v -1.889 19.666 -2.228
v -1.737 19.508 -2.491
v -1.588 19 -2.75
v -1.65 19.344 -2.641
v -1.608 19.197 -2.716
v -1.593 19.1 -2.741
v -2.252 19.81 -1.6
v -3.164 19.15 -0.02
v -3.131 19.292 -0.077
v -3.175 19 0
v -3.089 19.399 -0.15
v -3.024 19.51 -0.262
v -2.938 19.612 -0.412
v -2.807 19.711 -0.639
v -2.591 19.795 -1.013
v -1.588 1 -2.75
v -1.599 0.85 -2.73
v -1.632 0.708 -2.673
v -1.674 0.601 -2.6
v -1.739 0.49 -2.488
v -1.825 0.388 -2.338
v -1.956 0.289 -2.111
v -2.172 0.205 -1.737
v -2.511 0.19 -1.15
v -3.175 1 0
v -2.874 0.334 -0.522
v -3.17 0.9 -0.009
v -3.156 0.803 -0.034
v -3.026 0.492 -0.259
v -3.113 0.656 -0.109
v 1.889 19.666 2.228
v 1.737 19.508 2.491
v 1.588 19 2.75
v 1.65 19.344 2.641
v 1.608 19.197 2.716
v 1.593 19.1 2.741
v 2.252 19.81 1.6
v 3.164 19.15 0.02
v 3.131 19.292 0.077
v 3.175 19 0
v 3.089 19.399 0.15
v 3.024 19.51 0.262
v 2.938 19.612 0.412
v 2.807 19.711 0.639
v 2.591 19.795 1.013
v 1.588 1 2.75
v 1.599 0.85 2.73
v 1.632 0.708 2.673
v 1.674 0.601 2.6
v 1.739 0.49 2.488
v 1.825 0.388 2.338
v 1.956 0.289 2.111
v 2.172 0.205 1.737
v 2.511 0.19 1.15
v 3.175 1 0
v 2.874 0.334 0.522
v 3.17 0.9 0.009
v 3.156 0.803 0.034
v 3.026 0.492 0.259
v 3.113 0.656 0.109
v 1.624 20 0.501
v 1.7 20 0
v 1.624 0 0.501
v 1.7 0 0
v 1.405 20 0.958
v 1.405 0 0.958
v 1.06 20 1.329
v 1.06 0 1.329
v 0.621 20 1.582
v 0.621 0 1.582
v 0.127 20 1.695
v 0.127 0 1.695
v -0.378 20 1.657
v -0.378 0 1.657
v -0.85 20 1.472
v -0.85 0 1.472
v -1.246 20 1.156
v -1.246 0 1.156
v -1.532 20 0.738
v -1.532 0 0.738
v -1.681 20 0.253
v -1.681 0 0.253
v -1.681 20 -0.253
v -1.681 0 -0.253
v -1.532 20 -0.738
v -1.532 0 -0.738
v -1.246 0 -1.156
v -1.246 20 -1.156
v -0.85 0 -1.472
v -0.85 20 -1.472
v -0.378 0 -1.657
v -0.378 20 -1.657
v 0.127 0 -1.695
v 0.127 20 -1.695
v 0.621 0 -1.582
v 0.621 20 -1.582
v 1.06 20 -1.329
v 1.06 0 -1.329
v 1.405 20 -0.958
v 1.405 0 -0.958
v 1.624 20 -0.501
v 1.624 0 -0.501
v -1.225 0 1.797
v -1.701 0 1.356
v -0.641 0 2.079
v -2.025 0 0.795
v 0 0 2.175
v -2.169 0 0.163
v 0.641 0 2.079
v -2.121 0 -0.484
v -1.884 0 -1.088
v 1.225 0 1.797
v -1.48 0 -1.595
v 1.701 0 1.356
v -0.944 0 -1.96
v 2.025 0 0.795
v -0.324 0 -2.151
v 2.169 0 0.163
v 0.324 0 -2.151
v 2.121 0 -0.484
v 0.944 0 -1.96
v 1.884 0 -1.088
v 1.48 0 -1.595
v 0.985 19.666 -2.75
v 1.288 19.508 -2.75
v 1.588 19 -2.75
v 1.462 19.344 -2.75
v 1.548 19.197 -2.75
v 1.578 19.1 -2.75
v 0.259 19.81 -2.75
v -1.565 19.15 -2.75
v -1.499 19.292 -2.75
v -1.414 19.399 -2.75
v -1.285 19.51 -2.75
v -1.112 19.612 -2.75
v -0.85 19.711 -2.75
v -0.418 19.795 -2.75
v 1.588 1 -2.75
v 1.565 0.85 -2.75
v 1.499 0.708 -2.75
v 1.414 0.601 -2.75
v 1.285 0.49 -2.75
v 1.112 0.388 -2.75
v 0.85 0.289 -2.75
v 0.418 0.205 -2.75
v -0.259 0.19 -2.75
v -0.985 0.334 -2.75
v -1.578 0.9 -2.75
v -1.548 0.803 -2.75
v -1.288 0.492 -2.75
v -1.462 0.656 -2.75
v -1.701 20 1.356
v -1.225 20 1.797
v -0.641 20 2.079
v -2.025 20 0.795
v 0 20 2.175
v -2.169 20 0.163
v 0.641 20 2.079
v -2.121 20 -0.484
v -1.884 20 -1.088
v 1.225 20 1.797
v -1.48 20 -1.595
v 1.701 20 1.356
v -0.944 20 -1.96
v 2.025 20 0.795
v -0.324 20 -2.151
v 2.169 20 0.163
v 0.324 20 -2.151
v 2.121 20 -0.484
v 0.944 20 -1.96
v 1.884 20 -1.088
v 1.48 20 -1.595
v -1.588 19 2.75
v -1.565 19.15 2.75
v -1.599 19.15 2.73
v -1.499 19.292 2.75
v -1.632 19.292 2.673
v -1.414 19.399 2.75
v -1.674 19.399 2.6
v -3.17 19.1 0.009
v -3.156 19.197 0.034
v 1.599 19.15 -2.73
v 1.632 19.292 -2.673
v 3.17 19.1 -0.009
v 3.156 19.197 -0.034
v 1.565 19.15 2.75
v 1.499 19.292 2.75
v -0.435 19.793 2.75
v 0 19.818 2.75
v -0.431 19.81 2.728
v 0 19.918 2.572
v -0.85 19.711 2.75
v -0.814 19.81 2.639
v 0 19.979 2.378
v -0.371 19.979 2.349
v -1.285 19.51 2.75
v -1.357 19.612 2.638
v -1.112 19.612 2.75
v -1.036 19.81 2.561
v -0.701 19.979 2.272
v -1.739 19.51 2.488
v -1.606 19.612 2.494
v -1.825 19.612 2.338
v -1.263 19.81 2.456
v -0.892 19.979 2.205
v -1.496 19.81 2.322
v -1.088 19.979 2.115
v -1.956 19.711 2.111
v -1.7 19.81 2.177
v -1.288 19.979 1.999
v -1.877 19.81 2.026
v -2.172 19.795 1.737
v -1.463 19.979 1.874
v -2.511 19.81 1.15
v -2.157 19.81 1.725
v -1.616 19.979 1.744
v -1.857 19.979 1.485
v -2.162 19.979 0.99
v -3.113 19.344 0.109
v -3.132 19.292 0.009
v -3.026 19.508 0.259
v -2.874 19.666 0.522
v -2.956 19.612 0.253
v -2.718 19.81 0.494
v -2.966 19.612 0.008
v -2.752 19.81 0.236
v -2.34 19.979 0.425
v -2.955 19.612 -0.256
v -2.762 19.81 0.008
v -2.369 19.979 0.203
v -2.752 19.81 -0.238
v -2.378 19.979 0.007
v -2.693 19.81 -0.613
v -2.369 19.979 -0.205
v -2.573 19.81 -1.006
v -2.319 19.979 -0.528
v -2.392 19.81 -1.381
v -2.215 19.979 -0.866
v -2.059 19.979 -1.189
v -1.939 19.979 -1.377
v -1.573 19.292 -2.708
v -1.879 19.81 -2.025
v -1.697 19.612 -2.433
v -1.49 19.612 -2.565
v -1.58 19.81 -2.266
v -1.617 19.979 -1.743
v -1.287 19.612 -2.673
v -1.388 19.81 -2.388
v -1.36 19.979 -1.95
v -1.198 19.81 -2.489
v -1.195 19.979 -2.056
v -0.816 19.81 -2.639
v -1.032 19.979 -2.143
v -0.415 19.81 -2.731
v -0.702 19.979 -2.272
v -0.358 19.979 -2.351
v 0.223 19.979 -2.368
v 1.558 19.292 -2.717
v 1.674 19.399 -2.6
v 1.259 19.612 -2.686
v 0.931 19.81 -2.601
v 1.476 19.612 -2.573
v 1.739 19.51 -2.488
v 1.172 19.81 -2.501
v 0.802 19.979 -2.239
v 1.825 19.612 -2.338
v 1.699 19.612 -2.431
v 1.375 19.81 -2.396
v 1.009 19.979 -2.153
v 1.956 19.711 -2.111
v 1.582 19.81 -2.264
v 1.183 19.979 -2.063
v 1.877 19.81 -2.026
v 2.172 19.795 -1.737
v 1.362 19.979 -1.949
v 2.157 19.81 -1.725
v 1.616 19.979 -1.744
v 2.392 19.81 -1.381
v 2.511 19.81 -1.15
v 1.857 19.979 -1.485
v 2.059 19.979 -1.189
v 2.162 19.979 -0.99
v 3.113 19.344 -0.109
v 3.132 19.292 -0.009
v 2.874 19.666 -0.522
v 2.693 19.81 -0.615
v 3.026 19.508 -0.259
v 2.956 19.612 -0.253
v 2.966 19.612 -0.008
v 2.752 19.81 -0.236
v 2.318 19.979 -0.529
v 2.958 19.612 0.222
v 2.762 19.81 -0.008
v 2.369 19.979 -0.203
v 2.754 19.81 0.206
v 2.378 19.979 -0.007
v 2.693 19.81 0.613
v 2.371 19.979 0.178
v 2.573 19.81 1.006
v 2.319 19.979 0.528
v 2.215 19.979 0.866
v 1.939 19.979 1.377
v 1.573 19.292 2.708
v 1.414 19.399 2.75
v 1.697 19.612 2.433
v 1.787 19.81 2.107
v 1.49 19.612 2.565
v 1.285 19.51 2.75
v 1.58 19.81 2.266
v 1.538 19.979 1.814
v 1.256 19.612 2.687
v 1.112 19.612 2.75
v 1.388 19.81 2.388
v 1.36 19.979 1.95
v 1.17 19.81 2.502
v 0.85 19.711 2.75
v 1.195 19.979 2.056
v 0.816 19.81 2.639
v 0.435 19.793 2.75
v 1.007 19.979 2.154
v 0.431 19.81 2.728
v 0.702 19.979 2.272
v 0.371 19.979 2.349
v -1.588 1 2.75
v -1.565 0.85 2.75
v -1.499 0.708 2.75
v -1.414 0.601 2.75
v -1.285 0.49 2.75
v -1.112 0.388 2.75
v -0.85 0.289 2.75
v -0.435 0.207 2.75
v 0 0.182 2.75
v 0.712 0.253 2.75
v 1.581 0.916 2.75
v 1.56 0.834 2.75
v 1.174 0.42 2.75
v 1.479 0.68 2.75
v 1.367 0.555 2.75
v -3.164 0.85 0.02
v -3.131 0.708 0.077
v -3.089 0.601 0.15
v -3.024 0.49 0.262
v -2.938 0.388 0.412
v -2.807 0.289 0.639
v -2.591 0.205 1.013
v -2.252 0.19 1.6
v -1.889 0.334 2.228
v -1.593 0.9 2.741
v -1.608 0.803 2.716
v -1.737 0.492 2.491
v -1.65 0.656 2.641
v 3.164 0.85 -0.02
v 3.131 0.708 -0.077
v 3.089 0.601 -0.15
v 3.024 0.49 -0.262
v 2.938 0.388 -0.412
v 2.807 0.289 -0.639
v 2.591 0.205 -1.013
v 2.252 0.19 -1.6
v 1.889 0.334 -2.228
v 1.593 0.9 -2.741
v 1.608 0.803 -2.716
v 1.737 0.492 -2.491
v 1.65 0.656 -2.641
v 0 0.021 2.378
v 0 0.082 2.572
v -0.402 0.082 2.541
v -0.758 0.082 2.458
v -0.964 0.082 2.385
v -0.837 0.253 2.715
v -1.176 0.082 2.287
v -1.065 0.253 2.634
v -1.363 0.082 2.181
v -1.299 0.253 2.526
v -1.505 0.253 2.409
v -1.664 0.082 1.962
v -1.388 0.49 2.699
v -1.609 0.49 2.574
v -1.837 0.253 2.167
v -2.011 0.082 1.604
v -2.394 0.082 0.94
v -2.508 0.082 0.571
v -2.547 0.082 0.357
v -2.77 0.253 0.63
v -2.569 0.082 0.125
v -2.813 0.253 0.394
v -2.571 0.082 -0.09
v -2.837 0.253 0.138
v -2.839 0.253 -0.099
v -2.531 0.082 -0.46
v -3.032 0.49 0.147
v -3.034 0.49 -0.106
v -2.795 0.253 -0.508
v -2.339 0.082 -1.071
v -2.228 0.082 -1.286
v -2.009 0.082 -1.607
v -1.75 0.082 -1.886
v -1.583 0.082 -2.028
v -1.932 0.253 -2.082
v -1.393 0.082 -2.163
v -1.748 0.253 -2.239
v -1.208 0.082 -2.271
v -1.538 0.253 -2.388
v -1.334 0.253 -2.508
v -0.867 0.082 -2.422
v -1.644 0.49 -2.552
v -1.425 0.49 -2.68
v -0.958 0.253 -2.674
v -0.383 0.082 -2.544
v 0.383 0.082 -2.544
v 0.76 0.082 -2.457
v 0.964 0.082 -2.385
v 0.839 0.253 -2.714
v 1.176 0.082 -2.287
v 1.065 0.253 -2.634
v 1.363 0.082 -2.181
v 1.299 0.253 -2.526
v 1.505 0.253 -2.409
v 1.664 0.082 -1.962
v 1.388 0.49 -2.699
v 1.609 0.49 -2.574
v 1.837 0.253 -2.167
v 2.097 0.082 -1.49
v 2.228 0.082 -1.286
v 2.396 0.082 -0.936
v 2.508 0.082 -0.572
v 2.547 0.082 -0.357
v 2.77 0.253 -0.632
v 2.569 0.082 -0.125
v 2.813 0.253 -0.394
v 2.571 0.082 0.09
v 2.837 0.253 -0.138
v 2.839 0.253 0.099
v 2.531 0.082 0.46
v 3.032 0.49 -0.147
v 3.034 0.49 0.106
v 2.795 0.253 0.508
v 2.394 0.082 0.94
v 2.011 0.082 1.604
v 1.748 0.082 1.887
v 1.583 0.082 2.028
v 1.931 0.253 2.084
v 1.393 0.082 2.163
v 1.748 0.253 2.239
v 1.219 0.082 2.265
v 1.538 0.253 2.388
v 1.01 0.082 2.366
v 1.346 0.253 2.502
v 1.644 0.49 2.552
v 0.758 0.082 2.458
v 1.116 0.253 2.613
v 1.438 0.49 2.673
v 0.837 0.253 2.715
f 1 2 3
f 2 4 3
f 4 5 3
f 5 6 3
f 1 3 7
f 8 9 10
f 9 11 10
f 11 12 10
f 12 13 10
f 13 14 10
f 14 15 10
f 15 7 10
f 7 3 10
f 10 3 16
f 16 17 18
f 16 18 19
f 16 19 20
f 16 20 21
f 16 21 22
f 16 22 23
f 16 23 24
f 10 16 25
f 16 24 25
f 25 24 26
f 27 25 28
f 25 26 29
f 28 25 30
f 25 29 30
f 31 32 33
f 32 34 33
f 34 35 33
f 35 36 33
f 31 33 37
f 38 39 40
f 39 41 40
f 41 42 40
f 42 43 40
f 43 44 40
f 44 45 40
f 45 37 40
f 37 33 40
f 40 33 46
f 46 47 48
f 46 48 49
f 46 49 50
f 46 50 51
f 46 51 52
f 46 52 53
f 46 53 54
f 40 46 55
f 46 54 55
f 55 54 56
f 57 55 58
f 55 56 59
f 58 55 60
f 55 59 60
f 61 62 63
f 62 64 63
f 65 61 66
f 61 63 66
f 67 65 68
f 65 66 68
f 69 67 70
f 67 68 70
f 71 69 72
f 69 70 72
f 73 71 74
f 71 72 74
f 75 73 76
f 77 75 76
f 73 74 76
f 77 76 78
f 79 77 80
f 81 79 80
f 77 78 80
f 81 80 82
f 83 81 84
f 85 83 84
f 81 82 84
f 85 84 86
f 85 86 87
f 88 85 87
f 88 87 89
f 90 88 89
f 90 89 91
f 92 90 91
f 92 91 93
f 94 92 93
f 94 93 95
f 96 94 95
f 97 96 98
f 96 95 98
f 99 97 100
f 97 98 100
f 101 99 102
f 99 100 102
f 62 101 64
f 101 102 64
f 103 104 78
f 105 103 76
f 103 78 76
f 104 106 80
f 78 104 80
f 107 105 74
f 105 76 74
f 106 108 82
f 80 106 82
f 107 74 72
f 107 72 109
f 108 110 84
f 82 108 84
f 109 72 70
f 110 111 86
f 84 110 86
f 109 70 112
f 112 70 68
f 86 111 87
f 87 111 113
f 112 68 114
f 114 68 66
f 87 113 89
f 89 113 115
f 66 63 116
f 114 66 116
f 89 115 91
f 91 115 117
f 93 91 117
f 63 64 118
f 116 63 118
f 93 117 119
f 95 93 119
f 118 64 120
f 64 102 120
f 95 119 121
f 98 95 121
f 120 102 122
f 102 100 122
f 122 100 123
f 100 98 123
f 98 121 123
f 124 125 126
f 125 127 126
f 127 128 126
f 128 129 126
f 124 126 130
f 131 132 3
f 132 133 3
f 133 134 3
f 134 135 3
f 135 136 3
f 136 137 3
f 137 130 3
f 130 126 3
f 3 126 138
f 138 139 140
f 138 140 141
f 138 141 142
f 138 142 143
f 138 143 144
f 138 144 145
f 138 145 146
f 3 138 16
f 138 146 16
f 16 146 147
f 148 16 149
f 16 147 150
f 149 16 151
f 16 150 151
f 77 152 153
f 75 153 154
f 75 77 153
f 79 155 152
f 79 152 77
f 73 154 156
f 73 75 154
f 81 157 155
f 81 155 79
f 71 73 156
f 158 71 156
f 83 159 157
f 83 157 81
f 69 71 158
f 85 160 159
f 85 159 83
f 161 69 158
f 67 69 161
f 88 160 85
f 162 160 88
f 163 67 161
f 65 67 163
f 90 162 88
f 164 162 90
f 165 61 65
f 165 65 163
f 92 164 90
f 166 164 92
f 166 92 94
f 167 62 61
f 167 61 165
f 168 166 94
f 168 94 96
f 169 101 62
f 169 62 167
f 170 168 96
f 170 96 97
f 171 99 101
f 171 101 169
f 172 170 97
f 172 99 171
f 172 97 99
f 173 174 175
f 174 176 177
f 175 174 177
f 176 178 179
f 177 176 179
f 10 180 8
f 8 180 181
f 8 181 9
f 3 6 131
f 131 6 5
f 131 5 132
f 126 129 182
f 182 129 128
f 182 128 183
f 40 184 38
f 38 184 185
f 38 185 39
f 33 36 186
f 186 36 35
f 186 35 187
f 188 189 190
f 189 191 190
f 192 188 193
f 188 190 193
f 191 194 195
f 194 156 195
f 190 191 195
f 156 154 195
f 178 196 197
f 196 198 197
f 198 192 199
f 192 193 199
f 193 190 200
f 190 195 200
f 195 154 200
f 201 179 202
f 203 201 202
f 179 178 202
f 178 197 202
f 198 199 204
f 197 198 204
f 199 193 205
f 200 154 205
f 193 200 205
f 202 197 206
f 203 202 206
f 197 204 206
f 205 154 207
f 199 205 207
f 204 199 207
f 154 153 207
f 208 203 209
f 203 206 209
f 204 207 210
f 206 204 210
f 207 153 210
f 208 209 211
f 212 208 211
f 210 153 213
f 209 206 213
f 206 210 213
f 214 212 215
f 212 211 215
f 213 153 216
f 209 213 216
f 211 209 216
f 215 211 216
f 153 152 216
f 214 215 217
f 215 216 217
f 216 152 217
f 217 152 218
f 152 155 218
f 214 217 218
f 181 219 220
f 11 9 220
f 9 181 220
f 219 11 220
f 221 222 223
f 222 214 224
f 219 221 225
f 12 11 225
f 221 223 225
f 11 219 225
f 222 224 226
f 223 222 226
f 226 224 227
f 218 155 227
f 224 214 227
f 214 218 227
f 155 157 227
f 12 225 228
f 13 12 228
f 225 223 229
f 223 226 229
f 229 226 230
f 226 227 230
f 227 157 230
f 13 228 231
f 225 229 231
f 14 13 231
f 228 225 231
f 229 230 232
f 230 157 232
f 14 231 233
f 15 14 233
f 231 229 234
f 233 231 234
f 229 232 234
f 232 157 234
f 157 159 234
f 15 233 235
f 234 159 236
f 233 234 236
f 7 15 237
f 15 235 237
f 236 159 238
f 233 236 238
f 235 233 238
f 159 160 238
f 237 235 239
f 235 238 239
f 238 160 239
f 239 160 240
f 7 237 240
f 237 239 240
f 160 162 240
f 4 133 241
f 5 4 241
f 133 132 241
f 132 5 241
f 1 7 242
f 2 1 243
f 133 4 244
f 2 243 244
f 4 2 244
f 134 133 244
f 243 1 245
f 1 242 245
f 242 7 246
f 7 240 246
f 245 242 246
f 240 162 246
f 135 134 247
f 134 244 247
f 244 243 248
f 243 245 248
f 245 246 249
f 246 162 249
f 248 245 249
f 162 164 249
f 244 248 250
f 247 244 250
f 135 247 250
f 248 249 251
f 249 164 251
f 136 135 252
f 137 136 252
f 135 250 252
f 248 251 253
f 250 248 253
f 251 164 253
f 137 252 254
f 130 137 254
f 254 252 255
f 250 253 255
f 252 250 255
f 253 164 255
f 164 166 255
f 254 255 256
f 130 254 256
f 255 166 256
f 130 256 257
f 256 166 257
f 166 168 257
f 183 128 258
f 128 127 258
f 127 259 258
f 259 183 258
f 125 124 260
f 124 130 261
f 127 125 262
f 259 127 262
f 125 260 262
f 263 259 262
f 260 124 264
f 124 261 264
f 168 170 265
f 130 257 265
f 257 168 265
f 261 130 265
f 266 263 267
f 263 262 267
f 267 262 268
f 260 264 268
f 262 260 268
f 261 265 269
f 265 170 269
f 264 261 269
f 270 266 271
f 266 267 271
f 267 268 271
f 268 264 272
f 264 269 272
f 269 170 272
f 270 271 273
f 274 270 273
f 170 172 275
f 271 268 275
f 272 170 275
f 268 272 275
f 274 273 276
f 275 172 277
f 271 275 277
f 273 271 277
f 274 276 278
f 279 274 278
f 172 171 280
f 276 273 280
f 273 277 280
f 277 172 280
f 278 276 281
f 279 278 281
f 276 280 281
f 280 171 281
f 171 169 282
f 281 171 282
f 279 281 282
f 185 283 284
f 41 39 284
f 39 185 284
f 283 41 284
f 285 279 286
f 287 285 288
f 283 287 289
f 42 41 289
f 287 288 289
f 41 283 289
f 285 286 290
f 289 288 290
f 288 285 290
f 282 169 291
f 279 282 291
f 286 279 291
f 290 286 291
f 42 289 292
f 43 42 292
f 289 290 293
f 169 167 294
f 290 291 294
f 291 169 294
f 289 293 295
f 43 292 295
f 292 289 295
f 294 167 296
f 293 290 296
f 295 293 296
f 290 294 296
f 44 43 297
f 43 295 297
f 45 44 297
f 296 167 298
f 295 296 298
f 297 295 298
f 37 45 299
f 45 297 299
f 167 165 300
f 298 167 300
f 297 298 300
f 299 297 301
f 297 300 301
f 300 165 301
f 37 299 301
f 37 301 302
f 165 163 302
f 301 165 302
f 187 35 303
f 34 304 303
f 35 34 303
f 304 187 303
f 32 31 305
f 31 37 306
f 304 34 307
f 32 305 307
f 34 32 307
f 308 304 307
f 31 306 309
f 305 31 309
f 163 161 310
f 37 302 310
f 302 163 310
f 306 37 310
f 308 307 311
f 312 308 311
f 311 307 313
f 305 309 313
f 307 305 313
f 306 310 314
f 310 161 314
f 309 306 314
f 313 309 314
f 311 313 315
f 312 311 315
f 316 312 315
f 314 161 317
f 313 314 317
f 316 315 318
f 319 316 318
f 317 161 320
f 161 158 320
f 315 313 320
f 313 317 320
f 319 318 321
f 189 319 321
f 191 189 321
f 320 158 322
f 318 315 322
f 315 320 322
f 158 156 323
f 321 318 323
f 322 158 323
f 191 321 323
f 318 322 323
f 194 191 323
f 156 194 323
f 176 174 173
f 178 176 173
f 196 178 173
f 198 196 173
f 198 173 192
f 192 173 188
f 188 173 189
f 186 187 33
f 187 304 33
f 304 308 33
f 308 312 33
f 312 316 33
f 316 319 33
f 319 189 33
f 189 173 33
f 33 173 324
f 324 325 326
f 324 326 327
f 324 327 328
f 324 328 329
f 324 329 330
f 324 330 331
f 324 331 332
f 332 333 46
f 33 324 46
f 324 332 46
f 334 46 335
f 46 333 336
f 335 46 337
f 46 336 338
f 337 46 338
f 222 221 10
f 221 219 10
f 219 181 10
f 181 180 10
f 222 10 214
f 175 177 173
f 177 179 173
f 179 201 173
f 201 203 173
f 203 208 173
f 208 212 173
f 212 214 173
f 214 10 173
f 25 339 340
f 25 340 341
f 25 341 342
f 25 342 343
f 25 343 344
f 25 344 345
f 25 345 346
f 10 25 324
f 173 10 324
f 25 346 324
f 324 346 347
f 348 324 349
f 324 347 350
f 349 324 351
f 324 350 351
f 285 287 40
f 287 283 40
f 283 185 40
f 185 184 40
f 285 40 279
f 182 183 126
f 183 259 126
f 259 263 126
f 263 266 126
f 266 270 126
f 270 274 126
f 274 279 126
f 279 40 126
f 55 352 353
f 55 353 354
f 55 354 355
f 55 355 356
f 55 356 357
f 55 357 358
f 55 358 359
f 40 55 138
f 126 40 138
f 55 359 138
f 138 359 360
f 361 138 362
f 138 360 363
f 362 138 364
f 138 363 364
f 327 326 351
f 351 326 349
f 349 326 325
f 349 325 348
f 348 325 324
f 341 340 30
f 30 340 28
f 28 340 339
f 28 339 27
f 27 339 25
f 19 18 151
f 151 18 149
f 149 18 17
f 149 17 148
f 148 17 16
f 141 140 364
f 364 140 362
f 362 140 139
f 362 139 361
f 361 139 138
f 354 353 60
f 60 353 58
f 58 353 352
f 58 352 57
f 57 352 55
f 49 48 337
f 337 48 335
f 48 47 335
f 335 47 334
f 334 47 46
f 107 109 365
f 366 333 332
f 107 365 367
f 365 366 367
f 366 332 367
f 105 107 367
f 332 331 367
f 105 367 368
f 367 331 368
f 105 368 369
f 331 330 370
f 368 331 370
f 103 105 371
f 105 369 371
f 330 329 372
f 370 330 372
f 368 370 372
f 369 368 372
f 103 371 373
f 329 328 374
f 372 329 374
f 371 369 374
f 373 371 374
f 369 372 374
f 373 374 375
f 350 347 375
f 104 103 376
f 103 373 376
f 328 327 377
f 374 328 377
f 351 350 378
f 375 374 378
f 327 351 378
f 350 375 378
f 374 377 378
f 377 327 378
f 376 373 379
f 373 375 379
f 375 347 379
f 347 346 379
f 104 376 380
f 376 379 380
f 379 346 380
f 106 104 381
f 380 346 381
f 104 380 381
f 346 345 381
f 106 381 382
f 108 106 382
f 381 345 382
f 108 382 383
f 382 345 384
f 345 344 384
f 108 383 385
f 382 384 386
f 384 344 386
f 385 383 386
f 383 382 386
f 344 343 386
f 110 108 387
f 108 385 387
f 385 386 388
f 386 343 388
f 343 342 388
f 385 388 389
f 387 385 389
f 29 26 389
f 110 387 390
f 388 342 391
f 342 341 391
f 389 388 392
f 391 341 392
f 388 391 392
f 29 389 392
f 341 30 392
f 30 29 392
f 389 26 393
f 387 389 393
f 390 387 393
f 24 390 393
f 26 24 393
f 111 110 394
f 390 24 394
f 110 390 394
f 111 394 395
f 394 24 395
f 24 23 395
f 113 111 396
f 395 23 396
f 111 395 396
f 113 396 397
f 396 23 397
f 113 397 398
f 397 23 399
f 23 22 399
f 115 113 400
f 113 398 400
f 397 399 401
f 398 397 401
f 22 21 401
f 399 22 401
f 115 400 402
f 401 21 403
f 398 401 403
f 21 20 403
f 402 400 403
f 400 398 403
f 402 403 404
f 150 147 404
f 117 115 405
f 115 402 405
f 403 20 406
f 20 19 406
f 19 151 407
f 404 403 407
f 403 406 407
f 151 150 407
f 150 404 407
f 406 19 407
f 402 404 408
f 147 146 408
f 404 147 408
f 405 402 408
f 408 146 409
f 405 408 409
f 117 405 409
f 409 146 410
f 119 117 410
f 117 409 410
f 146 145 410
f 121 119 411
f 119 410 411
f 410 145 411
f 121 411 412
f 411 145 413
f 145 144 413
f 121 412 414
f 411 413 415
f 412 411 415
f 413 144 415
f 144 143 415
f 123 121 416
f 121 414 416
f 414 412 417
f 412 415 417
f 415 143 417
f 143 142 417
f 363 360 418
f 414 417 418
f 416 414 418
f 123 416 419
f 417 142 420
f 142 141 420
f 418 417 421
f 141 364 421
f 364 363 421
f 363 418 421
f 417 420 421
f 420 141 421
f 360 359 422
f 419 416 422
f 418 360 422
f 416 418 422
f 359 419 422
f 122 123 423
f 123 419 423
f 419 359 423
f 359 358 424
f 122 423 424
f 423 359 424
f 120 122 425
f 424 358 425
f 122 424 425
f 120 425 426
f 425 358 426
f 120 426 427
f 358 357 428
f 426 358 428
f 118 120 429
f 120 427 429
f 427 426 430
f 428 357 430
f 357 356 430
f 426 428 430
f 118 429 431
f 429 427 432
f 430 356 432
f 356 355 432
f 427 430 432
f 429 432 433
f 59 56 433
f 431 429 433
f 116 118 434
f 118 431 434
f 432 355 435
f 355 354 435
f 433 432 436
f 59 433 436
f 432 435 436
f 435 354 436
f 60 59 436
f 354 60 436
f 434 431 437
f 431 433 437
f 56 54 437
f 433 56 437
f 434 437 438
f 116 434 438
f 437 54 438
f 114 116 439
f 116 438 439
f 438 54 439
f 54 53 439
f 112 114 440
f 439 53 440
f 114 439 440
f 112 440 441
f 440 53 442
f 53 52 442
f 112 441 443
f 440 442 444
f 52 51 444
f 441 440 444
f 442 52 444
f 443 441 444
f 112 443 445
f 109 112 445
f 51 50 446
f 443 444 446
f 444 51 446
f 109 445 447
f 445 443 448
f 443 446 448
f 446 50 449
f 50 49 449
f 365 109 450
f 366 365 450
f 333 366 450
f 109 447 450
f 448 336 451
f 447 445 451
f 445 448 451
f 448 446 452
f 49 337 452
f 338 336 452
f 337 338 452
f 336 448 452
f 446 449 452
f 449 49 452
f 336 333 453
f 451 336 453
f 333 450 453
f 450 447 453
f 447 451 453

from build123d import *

# Parameters (mm, degrees)
BOSS_EXTRUDE1_DEPTH      = 20
M3_CLEARANCE_HOLE1_D     = 3.4
M3_CLEARANCE_HOLE1_DEPTH = 20
M3_CLEARANCE_HOLE1_TIP   = 1.021463052


with BuildPart() as part:
    # Sketch1 → Boss-Extrude1 (new body)
    with BuildSketch(Plane(origin=(0, 0, 0), x_dir=(1, 0, 0), z_dir=(0, 1, 0))):
        Polygon((3.175426481, 0), (1.58771324, 2.75), (-1.58771324, 2.75), (-3.175426481, 0), (-1.58771324, -2.75), (1.58771324, -2.75), align=None)
    extrude(amount=BOSS_EXTRUDE1_DEPTH)

    # M3 Clearance Hole1
    with Locations(Plane(origin=(0, 20, 0), x_dir=(-1, 0, 0), z_dir=(0, 1, 0))):
        with Locations((0, 0)):
            Hole(M3_CLEARANCE_HOLE1_D / 2, depth=M3_CLEARANCE_HOLE1_DEPTH)
            with Locations((0, 0, -(M3_CLEARANCE_HOLE1_DEPTH + M3_CLEARANCE_HOLE1_TIP / 2))):  # 118° drill point
                Cone(0, M3_CLEARANCE_HOLE1_D / 2, M3_CLEARANCE_HOLE1_TIP, mode=Mode.SUBTRACT)

    # Sketch4 → Cut-Revolve1 (revolve, cut)
    with BuildSketch(Plane.XY, mode=Mode.PRIVATE) as cut_revolve1_sk:
        with BuildLine():
            Line((-2.175426481, 20), (-3.175426481, 20))
            Line((-3.175426481, 20), (-3.175426481, 19))
            ThreePointArc((-3.175426481, 19), (-2.882533262, 19.707106781), (-2.175426481, 20))
        make_face()
        with BuildLine():
            Line((-3.175426481, 1), (-3.175426481, 0))
            Line((-3.175426481, 0), (-2.175426481, 0))
            ThreePointArc((-2.175426481, 0), (-2.882533262, 0.292893219), (-3.175426481, 1))
        make_face()
    revolve(cut_revolve1_sk.sketch.rotate(Axis((0, 20, 0), (0, -1, 0)), 270), axis=Axis((0, 20, 0), (0, -1, 0)), mode=Mode.SUBTRACT)


solid = part.part
